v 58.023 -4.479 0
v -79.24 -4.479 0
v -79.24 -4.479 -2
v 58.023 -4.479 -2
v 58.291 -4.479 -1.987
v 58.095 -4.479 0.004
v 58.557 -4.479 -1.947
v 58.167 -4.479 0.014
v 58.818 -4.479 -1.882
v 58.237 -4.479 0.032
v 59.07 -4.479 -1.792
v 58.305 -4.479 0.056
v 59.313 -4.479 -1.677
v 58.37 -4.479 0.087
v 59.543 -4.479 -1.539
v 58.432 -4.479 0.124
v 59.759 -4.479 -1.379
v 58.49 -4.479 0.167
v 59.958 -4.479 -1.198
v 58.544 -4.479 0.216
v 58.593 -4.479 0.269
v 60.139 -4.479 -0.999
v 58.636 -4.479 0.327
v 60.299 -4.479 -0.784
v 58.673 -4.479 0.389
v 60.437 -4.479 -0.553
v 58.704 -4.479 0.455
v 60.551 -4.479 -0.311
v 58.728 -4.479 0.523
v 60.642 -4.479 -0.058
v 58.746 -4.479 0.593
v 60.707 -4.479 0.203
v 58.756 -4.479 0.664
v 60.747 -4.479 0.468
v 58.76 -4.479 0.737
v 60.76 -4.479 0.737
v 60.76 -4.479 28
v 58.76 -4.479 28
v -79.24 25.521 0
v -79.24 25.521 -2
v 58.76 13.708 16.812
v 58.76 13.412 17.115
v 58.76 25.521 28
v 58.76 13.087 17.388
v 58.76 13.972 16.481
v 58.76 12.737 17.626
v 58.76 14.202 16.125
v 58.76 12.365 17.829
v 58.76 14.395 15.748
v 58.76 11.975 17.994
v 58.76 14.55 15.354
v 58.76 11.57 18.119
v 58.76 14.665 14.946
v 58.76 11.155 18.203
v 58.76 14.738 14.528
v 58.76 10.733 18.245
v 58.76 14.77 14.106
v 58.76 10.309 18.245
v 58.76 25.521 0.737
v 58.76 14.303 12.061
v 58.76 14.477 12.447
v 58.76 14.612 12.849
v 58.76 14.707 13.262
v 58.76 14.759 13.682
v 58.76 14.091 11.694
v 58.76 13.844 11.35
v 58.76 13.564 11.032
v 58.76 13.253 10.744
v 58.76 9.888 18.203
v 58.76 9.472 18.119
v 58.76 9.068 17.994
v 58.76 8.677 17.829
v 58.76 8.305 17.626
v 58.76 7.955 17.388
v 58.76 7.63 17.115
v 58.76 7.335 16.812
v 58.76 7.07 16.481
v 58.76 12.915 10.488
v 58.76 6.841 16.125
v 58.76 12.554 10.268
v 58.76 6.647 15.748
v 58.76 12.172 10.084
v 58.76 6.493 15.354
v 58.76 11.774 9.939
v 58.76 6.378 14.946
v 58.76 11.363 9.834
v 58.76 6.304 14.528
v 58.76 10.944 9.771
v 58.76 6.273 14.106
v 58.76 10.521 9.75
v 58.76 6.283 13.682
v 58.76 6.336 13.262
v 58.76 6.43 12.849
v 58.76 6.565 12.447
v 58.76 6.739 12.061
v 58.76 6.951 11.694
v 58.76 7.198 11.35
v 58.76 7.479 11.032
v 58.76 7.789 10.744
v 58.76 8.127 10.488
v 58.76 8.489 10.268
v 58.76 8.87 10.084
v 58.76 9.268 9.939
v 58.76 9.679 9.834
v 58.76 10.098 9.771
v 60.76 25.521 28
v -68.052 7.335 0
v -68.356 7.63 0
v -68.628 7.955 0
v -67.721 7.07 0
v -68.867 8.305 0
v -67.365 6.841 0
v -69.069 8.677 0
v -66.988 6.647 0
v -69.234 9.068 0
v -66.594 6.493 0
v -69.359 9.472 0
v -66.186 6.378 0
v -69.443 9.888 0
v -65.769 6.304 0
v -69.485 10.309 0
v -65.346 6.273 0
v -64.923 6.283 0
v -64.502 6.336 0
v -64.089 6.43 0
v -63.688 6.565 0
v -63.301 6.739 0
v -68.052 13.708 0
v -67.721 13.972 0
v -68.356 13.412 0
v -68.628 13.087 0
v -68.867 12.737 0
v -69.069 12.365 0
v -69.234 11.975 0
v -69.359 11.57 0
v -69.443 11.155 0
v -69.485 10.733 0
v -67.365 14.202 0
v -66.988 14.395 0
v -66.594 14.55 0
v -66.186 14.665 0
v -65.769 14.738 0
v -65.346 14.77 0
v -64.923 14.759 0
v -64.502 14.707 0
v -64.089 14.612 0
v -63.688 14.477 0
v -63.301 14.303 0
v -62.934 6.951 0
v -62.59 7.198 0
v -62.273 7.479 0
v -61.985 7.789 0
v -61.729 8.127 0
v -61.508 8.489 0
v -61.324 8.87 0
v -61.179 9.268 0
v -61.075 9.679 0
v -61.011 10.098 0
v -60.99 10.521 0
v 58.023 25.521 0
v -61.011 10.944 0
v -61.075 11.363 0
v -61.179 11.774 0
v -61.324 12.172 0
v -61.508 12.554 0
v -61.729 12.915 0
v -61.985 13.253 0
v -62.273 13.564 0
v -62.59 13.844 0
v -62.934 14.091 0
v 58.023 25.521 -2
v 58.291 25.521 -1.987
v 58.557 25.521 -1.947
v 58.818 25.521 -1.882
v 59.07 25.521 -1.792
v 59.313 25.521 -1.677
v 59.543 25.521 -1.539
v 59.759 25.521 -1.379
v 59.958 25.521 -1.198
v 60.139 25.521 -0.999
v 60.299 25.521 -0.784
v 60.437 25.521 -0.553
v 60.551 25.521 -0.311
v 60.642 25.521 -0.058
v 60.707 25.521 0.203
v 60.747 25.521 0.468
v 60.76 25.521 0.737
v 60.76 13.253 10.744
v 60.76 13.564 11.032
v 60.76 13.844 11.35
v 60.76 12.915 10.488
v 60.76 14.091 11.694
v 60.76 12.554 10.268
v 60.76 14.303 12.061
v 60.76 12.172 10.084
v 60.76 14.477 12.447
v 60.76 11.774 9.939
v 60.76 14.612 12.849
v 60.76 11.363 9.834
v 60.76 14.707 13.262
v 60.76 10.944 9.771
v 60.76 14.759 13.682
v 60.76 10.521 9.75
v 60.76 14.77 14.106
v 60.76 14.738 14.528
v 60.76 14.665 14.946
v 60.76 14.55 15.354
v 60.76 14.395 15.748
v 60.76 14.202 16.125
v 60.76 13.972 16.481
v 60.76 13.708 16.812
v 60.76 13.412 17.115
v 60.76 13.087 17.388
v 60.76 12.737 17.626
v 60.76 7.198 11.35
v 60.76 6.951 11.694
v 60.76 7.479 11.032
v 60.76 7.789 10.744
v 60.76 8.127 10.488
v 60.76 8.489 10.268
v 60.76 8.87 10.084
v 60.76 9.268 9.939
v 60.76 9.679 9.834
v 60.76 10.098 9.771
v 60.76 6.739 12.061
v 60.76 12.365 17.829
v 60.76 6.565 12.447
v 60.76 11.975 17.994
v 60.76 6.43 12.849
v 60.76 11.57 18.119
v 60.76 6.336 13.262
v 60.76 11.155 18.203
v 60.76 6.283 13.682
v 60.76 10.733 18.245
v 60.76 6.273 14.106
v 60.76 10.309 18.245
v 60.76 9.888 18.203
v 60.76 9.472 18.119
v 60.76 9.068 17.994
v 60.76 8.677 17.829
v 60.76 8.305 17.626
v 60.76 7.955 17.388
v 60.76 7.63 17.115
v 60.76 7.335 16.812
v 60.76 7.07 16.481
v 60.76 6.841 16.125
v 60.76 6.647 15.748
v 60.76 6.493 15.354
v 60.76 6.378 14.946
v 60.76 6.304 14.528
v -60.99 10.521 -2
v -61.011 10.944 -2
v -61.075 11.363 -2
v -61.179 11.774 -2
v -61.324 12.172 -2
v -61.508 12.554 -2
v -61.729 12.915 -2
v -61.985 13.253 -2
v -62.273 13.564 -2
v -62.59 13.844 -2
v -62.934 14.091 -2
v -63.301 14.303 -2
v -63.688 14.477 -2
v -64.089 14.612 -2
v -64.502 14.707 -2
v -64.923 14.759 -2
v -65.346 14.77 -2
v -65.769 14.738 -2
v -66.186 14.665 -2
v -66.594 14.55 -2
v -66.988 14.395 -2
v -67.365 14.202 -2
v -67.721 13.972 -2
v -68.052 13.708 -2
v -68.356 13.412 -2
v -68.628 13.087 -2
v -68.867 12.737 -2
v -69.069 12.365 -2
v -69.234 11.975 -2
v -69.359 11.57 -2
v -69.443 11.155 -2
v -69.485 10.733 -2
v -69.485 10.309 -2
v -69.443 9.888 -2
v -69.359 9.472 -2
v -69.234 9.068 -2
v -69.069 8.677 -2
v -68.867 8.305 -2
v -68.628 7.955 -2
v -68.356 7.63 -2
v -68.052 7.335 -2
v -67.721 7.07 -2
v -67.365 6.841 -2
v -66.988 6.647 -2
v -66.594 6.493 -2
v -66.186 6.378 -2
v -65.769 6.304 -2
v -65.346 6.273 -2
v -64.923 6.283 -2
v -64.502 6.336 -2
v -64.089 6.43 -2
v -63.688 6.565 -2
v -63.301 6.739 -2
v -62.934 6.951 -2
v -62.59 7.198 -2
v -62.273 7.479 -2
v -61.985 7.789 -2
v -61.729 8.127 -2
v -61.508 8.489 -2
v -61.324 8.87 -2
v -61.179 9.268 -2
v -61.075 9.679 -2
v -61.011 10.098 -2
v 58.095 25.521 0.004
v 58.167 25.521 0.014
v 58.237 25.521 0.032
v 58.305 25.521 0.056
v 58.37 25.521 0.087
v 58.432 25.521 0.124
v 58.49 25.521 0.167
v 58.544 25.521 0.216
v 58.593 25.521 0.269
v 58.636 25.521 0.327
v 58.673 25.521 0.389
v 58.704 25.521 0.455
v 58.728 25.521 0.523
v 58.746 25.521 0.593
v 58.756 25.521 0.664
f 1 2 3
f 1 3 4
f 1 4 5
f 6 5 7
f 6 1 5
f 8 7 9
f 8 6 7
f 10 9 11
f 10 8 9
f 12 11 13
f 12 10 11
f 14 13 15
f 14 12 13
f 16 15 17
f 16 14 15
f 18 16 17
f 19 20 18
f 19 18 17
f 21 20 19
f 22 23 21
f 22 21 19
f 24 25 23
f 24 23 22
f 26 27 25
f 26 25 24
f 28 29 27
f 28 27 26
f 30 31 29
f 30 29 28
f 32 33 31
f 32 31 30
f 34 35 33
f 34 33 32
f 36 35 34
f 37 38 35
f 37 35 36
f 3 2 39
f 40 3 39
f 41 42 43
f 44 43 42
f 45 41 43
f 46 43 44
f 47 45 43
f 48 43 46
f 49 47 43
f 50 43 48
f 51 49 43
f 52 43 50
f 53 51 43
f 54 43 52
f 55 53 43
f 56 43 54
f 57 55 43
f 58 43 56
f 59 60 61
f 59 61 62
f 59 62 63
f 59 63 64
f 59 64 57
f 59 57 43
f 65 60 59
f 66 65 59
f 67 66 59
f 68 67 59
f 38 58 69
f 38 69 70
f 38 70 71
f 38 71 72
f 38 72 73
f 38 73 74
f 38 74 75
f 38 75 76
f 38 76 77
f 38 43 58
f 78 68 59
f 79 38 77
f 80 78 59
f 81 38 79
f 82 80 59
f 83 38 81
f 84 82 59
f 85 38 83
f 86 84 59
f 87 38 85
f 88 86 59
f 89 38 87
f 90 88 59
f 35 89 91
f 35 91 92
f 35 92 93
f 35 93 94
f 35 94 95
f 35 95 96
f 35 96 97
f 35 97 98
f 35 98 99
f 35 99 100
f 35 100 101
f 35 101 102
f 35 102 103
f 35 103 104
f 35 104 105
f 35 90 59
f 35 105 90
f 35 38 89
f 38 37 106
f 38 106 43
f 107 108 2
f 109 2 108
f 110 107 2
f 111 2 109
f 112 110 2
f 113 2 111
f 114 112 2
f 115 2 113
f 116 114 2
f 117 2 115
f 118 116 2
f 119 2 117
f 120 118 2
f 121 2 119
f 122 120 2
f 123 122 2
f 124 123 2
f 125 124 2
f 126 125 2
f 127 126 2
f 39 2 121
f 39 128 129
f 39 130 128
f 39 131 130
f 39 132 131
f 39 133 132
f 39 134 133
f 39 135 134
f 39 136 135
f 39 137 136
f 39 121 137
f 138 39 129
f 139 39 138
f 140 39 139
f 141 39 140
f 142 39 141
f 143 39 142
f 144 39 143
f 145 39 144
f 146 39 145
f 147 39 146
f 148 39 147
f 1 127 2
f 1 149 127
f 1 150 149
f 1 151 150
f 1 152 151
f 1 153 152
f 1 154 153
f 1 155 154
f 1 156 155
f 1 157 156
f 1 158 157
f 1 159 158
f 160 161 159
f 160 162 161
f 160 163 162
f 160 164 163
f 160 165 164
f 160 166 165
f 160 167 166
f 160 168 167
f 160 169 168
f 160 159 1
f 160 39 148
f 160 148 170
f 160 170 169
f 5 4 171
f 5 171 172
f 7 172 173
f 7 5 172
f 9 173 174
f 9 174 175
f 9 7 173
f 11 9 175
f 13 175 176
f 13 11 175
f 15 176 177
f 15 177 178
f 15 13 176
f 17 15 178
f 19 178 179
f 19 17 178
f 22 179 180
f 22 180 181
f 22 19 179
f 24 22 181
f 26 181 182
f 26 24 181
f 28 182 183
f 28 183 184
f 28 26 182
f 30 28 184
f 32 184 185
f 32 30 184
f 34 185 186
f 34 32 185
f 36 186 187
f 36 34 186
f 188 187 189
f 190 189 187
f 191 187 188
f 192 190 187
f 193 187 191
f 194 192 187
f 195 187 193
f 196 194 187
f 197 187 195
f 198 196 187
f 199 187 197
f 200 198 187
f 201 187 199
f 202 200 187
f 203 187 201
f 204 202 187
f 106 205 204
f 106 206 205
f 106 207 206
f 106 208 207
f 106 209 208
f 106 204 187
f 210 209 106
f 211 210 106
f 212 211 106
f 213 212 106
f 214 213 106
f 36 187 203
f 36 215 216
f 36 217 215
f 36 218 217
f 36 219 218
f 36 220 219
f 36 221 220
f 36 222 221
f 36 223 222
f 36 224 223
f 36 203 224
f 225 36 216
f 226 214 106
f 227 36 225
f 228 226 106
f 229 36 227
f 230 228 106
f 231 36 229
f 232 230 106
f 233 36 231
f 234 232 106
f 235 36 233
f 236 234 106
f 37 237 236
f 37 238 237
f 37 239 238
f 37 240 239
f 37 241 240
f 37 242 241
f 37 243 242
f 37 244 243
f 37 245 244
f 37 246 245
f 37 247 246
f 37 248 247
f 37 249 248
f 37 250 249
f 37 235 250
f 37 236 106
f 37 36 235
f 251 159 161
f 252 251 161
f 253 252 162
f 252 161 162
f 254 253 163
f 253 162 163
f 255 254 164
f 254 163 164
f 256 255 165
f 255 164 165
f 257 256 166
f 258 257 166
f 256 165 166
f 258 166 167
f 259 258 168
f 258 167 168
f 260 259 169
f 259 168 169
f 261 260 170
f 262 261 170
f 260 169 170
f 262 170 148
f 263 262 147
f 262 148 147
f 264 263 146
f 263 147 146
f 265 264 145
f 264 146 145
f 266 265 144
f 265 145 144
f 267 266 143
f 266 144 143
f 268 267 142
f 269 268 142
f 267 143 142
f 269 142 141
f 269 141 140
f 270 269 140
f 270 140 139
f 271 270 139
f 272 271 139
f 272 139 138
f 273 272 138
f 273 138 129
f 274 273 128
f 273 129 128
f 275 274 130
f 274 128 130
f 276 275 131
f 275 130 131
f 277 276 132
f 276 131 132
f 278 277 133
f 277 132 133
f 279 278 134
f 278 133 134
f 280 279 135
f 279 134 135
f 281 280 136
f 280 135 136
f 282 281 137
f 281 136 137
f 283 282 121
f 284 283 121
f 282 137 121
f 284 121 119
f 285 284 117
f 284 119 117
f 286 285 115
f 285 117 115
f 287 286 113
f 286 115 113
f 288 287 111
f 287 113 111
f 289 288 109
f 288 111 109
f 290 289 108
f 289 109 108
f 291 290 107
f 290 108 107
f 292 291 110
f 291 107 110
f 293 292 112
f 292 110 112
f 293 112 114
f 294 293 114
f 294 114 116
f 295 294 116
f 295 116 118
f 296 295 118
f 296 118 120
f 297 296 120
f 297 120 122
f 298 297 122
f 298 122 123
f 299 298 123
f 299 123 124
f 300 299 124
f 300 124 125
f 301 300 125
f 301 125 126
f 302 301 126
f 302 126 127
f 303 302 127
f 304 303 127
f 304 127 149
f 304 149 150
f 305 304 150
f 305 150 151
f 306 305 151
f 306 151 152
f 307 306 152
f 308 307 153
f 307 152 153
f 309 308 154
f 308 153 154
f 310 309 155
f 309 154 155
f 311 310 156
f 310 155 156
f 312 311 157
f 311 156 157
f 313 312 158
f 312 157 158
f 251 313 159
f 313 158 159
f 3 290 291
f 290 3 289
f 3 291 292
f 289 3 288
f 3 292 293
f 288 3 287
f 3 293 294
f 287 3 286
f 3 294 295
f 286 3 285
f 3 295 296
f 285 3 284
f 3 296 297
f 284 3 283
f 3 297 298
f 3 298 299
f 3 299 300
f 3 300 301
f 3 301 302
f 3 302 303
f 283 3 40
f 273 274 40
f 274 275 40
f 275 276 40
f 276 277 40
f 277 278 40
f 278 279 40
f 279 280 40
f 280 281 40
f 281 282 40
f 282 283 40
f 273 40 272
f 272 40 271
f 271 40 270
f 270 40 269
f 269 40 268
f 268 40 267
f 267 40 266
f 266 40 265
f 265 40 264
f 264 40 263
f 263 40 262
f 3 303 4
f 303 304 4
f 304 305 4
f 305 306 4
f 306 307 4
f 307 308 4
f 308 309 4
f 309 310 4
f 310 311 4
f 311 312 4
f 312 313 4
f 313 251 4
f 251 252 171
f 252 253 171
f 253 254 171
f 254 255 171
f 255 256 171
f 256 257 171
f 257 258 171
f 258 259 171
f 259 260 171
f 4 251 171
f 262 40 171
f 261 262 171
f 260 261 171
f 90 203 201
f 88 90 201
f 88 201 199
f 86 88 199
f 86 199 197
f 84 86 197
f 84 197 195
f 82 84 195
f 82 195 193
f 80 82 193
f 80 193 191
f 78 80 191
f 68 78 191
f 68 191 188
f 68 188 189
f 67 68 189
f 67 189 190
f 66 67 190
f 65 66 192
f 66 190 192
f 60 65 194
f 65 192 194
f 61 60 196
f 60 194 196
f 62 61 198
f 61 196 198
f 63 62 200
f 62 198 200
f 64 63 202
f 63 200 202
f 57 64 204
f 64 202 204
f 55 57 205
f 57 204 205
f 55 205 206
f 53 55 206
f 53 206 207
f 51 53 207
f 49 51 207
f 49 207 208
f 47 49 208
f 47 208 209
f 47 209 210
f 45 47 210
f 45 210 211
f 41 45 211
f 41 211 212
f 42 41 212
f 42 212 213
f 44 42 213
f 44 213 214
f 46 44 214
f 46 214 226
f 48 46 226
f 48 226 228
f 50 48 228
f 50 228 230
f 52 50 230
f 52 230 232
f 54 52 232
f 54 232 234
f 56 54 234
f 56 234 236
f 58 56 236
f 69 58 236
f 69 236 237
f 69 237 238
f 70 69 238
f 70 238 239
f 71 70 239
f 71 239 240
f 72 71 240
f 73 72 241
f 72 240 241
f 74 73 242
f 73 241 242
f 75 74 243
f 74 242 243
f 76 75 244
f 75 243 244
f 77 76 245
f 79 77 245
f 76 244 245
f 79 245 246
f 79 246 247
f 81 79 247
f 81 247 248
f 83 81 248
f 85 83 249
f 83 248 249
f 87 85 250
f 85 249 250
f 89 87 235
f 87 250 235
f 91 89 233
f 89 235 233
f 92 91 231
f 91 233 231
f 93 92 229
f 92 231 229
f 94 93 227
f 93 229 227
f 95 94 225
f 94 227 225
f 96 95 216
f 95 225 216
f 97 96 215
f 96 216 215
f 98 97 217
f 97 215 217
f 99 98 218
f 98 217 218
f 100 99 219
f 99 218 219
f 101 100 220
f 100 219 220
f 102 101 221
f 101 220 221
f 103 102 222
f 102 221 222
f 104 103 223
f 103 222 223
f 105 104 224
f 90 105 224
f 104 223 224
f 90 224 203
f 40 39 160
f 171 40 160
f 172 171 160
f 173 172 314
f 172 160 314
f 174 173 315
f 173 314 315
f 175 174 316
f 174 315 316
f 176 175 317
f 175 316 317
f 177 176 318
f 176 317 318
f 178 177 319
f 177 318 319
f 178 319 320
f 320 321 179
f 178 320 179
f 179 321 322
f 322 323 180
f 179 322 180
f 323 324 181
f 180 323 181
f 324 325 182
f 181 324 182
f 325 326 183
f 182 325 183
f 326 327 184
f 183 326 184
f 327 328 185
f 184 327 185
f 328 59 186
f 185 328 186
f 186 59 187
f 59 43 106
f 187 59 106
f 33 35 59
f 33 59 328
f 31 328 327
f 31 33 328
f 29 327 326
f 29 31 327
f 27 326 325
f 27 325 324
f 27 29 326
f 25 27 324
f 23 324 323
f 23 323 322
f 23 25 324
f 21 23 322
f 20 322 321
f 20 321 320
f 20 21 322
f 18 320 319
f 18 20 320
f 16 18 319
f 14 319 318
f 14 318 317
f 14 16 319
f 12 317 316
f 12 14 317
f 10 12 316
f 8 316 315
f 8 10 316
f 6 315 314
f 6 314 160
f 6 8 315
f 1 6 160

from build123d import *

# Parameters (mm, degrees)
SKETCH1_W                    = 140
SKETCH1_H                    = 30
SKETCH1_R                    = 4.25
BASE_FLANGE1_DEPTH           = 2
EDGE_FLANGE1_STRIP_W         = 9.4732
EDGE_FLANGE1_STRIP_H         = 2
EDGE_FLANGE1_STRIP_CUT_DEPTH = 30
EDGE_FLANGE1_DEPTH           = 30
SKETCH9_R                    = 4.25
CUT_EXTRUDE1_DEPTH           = 10


# Sheet-metal steps are written as plain solids
with BuildPart() as part:
    # Sketch1 → Base-Flange1 (new body)
    with BuildSketch(Plane.XY):
        with Locations((-9.240282686, 10.521201413)):
            Rectangle(SKETCH1_W, SKETCH1_H)
        with Locations((-65.240282686, 10.521201413)):
            Circle(SKETCH1_R, mode=Mode.SUBTRACT)
    extrude(amount=-BASE_FLANGE1_DEPTH)

    # Edge-Flange1 strip (across the edge) → Edge-Flange1 strip cut (cut)
    with BuildSketch(Plane(origin=(60.759717314, -4.478798587, 0), x_dir=(-1, 0, 0), z_dir=(0, 1, 0))):
        with Locations((-2, -1)):
            Rectangle(EDGE_FLANGE1_STRIP_W, EDGE_FLANGE1_STRIP_H)
    extrude(amount=EDGE_FLANGE1_STRIP_CUT_DEPTH, mode=Mode.SUBTRACT)

    # Edge-Flange1 section (across the edge) → Edge-Flange1 (add)
    with BuildSketch(Plane(origin=(60.759717314, -4.478798587, 0), x_dir=(-1, 0, 0), z_dir=(0, 1, 0))):
        with BuildLine():
            Line((0, 0.7366), (0, 28))
            Line((0, 28), (2, 28))
            Line((2, 28), (2, 0.7366))
            ThreePointArc((2, 0.7366), (2.215745145, 0.215745145), (2.7366, 0))
            Line((2.7366, 0), (2.7366, -2))
            ThreePointArc((2.7366, -2), (0.801531583, -1.198468417), (0, 0.7366))
        make_face()
    extrude(amount=EDGE_FLANGE1_DEPTH)

    # Sketch9 → Cut-Extrude1 (cut)
    with BuildSketch(Plane(origin=(60.759717314, 0, 0), x_dir=(0, 0, -1), z_dir=(1, 0, 0))):
        with Locations((-14, 10.521201413)):
            Circle(SKETCH9_R)
    extrude(amount=-CUT_EXTRUDE1_DEPTH, mode=Mode.SUBTRACT)


solid = part.part
